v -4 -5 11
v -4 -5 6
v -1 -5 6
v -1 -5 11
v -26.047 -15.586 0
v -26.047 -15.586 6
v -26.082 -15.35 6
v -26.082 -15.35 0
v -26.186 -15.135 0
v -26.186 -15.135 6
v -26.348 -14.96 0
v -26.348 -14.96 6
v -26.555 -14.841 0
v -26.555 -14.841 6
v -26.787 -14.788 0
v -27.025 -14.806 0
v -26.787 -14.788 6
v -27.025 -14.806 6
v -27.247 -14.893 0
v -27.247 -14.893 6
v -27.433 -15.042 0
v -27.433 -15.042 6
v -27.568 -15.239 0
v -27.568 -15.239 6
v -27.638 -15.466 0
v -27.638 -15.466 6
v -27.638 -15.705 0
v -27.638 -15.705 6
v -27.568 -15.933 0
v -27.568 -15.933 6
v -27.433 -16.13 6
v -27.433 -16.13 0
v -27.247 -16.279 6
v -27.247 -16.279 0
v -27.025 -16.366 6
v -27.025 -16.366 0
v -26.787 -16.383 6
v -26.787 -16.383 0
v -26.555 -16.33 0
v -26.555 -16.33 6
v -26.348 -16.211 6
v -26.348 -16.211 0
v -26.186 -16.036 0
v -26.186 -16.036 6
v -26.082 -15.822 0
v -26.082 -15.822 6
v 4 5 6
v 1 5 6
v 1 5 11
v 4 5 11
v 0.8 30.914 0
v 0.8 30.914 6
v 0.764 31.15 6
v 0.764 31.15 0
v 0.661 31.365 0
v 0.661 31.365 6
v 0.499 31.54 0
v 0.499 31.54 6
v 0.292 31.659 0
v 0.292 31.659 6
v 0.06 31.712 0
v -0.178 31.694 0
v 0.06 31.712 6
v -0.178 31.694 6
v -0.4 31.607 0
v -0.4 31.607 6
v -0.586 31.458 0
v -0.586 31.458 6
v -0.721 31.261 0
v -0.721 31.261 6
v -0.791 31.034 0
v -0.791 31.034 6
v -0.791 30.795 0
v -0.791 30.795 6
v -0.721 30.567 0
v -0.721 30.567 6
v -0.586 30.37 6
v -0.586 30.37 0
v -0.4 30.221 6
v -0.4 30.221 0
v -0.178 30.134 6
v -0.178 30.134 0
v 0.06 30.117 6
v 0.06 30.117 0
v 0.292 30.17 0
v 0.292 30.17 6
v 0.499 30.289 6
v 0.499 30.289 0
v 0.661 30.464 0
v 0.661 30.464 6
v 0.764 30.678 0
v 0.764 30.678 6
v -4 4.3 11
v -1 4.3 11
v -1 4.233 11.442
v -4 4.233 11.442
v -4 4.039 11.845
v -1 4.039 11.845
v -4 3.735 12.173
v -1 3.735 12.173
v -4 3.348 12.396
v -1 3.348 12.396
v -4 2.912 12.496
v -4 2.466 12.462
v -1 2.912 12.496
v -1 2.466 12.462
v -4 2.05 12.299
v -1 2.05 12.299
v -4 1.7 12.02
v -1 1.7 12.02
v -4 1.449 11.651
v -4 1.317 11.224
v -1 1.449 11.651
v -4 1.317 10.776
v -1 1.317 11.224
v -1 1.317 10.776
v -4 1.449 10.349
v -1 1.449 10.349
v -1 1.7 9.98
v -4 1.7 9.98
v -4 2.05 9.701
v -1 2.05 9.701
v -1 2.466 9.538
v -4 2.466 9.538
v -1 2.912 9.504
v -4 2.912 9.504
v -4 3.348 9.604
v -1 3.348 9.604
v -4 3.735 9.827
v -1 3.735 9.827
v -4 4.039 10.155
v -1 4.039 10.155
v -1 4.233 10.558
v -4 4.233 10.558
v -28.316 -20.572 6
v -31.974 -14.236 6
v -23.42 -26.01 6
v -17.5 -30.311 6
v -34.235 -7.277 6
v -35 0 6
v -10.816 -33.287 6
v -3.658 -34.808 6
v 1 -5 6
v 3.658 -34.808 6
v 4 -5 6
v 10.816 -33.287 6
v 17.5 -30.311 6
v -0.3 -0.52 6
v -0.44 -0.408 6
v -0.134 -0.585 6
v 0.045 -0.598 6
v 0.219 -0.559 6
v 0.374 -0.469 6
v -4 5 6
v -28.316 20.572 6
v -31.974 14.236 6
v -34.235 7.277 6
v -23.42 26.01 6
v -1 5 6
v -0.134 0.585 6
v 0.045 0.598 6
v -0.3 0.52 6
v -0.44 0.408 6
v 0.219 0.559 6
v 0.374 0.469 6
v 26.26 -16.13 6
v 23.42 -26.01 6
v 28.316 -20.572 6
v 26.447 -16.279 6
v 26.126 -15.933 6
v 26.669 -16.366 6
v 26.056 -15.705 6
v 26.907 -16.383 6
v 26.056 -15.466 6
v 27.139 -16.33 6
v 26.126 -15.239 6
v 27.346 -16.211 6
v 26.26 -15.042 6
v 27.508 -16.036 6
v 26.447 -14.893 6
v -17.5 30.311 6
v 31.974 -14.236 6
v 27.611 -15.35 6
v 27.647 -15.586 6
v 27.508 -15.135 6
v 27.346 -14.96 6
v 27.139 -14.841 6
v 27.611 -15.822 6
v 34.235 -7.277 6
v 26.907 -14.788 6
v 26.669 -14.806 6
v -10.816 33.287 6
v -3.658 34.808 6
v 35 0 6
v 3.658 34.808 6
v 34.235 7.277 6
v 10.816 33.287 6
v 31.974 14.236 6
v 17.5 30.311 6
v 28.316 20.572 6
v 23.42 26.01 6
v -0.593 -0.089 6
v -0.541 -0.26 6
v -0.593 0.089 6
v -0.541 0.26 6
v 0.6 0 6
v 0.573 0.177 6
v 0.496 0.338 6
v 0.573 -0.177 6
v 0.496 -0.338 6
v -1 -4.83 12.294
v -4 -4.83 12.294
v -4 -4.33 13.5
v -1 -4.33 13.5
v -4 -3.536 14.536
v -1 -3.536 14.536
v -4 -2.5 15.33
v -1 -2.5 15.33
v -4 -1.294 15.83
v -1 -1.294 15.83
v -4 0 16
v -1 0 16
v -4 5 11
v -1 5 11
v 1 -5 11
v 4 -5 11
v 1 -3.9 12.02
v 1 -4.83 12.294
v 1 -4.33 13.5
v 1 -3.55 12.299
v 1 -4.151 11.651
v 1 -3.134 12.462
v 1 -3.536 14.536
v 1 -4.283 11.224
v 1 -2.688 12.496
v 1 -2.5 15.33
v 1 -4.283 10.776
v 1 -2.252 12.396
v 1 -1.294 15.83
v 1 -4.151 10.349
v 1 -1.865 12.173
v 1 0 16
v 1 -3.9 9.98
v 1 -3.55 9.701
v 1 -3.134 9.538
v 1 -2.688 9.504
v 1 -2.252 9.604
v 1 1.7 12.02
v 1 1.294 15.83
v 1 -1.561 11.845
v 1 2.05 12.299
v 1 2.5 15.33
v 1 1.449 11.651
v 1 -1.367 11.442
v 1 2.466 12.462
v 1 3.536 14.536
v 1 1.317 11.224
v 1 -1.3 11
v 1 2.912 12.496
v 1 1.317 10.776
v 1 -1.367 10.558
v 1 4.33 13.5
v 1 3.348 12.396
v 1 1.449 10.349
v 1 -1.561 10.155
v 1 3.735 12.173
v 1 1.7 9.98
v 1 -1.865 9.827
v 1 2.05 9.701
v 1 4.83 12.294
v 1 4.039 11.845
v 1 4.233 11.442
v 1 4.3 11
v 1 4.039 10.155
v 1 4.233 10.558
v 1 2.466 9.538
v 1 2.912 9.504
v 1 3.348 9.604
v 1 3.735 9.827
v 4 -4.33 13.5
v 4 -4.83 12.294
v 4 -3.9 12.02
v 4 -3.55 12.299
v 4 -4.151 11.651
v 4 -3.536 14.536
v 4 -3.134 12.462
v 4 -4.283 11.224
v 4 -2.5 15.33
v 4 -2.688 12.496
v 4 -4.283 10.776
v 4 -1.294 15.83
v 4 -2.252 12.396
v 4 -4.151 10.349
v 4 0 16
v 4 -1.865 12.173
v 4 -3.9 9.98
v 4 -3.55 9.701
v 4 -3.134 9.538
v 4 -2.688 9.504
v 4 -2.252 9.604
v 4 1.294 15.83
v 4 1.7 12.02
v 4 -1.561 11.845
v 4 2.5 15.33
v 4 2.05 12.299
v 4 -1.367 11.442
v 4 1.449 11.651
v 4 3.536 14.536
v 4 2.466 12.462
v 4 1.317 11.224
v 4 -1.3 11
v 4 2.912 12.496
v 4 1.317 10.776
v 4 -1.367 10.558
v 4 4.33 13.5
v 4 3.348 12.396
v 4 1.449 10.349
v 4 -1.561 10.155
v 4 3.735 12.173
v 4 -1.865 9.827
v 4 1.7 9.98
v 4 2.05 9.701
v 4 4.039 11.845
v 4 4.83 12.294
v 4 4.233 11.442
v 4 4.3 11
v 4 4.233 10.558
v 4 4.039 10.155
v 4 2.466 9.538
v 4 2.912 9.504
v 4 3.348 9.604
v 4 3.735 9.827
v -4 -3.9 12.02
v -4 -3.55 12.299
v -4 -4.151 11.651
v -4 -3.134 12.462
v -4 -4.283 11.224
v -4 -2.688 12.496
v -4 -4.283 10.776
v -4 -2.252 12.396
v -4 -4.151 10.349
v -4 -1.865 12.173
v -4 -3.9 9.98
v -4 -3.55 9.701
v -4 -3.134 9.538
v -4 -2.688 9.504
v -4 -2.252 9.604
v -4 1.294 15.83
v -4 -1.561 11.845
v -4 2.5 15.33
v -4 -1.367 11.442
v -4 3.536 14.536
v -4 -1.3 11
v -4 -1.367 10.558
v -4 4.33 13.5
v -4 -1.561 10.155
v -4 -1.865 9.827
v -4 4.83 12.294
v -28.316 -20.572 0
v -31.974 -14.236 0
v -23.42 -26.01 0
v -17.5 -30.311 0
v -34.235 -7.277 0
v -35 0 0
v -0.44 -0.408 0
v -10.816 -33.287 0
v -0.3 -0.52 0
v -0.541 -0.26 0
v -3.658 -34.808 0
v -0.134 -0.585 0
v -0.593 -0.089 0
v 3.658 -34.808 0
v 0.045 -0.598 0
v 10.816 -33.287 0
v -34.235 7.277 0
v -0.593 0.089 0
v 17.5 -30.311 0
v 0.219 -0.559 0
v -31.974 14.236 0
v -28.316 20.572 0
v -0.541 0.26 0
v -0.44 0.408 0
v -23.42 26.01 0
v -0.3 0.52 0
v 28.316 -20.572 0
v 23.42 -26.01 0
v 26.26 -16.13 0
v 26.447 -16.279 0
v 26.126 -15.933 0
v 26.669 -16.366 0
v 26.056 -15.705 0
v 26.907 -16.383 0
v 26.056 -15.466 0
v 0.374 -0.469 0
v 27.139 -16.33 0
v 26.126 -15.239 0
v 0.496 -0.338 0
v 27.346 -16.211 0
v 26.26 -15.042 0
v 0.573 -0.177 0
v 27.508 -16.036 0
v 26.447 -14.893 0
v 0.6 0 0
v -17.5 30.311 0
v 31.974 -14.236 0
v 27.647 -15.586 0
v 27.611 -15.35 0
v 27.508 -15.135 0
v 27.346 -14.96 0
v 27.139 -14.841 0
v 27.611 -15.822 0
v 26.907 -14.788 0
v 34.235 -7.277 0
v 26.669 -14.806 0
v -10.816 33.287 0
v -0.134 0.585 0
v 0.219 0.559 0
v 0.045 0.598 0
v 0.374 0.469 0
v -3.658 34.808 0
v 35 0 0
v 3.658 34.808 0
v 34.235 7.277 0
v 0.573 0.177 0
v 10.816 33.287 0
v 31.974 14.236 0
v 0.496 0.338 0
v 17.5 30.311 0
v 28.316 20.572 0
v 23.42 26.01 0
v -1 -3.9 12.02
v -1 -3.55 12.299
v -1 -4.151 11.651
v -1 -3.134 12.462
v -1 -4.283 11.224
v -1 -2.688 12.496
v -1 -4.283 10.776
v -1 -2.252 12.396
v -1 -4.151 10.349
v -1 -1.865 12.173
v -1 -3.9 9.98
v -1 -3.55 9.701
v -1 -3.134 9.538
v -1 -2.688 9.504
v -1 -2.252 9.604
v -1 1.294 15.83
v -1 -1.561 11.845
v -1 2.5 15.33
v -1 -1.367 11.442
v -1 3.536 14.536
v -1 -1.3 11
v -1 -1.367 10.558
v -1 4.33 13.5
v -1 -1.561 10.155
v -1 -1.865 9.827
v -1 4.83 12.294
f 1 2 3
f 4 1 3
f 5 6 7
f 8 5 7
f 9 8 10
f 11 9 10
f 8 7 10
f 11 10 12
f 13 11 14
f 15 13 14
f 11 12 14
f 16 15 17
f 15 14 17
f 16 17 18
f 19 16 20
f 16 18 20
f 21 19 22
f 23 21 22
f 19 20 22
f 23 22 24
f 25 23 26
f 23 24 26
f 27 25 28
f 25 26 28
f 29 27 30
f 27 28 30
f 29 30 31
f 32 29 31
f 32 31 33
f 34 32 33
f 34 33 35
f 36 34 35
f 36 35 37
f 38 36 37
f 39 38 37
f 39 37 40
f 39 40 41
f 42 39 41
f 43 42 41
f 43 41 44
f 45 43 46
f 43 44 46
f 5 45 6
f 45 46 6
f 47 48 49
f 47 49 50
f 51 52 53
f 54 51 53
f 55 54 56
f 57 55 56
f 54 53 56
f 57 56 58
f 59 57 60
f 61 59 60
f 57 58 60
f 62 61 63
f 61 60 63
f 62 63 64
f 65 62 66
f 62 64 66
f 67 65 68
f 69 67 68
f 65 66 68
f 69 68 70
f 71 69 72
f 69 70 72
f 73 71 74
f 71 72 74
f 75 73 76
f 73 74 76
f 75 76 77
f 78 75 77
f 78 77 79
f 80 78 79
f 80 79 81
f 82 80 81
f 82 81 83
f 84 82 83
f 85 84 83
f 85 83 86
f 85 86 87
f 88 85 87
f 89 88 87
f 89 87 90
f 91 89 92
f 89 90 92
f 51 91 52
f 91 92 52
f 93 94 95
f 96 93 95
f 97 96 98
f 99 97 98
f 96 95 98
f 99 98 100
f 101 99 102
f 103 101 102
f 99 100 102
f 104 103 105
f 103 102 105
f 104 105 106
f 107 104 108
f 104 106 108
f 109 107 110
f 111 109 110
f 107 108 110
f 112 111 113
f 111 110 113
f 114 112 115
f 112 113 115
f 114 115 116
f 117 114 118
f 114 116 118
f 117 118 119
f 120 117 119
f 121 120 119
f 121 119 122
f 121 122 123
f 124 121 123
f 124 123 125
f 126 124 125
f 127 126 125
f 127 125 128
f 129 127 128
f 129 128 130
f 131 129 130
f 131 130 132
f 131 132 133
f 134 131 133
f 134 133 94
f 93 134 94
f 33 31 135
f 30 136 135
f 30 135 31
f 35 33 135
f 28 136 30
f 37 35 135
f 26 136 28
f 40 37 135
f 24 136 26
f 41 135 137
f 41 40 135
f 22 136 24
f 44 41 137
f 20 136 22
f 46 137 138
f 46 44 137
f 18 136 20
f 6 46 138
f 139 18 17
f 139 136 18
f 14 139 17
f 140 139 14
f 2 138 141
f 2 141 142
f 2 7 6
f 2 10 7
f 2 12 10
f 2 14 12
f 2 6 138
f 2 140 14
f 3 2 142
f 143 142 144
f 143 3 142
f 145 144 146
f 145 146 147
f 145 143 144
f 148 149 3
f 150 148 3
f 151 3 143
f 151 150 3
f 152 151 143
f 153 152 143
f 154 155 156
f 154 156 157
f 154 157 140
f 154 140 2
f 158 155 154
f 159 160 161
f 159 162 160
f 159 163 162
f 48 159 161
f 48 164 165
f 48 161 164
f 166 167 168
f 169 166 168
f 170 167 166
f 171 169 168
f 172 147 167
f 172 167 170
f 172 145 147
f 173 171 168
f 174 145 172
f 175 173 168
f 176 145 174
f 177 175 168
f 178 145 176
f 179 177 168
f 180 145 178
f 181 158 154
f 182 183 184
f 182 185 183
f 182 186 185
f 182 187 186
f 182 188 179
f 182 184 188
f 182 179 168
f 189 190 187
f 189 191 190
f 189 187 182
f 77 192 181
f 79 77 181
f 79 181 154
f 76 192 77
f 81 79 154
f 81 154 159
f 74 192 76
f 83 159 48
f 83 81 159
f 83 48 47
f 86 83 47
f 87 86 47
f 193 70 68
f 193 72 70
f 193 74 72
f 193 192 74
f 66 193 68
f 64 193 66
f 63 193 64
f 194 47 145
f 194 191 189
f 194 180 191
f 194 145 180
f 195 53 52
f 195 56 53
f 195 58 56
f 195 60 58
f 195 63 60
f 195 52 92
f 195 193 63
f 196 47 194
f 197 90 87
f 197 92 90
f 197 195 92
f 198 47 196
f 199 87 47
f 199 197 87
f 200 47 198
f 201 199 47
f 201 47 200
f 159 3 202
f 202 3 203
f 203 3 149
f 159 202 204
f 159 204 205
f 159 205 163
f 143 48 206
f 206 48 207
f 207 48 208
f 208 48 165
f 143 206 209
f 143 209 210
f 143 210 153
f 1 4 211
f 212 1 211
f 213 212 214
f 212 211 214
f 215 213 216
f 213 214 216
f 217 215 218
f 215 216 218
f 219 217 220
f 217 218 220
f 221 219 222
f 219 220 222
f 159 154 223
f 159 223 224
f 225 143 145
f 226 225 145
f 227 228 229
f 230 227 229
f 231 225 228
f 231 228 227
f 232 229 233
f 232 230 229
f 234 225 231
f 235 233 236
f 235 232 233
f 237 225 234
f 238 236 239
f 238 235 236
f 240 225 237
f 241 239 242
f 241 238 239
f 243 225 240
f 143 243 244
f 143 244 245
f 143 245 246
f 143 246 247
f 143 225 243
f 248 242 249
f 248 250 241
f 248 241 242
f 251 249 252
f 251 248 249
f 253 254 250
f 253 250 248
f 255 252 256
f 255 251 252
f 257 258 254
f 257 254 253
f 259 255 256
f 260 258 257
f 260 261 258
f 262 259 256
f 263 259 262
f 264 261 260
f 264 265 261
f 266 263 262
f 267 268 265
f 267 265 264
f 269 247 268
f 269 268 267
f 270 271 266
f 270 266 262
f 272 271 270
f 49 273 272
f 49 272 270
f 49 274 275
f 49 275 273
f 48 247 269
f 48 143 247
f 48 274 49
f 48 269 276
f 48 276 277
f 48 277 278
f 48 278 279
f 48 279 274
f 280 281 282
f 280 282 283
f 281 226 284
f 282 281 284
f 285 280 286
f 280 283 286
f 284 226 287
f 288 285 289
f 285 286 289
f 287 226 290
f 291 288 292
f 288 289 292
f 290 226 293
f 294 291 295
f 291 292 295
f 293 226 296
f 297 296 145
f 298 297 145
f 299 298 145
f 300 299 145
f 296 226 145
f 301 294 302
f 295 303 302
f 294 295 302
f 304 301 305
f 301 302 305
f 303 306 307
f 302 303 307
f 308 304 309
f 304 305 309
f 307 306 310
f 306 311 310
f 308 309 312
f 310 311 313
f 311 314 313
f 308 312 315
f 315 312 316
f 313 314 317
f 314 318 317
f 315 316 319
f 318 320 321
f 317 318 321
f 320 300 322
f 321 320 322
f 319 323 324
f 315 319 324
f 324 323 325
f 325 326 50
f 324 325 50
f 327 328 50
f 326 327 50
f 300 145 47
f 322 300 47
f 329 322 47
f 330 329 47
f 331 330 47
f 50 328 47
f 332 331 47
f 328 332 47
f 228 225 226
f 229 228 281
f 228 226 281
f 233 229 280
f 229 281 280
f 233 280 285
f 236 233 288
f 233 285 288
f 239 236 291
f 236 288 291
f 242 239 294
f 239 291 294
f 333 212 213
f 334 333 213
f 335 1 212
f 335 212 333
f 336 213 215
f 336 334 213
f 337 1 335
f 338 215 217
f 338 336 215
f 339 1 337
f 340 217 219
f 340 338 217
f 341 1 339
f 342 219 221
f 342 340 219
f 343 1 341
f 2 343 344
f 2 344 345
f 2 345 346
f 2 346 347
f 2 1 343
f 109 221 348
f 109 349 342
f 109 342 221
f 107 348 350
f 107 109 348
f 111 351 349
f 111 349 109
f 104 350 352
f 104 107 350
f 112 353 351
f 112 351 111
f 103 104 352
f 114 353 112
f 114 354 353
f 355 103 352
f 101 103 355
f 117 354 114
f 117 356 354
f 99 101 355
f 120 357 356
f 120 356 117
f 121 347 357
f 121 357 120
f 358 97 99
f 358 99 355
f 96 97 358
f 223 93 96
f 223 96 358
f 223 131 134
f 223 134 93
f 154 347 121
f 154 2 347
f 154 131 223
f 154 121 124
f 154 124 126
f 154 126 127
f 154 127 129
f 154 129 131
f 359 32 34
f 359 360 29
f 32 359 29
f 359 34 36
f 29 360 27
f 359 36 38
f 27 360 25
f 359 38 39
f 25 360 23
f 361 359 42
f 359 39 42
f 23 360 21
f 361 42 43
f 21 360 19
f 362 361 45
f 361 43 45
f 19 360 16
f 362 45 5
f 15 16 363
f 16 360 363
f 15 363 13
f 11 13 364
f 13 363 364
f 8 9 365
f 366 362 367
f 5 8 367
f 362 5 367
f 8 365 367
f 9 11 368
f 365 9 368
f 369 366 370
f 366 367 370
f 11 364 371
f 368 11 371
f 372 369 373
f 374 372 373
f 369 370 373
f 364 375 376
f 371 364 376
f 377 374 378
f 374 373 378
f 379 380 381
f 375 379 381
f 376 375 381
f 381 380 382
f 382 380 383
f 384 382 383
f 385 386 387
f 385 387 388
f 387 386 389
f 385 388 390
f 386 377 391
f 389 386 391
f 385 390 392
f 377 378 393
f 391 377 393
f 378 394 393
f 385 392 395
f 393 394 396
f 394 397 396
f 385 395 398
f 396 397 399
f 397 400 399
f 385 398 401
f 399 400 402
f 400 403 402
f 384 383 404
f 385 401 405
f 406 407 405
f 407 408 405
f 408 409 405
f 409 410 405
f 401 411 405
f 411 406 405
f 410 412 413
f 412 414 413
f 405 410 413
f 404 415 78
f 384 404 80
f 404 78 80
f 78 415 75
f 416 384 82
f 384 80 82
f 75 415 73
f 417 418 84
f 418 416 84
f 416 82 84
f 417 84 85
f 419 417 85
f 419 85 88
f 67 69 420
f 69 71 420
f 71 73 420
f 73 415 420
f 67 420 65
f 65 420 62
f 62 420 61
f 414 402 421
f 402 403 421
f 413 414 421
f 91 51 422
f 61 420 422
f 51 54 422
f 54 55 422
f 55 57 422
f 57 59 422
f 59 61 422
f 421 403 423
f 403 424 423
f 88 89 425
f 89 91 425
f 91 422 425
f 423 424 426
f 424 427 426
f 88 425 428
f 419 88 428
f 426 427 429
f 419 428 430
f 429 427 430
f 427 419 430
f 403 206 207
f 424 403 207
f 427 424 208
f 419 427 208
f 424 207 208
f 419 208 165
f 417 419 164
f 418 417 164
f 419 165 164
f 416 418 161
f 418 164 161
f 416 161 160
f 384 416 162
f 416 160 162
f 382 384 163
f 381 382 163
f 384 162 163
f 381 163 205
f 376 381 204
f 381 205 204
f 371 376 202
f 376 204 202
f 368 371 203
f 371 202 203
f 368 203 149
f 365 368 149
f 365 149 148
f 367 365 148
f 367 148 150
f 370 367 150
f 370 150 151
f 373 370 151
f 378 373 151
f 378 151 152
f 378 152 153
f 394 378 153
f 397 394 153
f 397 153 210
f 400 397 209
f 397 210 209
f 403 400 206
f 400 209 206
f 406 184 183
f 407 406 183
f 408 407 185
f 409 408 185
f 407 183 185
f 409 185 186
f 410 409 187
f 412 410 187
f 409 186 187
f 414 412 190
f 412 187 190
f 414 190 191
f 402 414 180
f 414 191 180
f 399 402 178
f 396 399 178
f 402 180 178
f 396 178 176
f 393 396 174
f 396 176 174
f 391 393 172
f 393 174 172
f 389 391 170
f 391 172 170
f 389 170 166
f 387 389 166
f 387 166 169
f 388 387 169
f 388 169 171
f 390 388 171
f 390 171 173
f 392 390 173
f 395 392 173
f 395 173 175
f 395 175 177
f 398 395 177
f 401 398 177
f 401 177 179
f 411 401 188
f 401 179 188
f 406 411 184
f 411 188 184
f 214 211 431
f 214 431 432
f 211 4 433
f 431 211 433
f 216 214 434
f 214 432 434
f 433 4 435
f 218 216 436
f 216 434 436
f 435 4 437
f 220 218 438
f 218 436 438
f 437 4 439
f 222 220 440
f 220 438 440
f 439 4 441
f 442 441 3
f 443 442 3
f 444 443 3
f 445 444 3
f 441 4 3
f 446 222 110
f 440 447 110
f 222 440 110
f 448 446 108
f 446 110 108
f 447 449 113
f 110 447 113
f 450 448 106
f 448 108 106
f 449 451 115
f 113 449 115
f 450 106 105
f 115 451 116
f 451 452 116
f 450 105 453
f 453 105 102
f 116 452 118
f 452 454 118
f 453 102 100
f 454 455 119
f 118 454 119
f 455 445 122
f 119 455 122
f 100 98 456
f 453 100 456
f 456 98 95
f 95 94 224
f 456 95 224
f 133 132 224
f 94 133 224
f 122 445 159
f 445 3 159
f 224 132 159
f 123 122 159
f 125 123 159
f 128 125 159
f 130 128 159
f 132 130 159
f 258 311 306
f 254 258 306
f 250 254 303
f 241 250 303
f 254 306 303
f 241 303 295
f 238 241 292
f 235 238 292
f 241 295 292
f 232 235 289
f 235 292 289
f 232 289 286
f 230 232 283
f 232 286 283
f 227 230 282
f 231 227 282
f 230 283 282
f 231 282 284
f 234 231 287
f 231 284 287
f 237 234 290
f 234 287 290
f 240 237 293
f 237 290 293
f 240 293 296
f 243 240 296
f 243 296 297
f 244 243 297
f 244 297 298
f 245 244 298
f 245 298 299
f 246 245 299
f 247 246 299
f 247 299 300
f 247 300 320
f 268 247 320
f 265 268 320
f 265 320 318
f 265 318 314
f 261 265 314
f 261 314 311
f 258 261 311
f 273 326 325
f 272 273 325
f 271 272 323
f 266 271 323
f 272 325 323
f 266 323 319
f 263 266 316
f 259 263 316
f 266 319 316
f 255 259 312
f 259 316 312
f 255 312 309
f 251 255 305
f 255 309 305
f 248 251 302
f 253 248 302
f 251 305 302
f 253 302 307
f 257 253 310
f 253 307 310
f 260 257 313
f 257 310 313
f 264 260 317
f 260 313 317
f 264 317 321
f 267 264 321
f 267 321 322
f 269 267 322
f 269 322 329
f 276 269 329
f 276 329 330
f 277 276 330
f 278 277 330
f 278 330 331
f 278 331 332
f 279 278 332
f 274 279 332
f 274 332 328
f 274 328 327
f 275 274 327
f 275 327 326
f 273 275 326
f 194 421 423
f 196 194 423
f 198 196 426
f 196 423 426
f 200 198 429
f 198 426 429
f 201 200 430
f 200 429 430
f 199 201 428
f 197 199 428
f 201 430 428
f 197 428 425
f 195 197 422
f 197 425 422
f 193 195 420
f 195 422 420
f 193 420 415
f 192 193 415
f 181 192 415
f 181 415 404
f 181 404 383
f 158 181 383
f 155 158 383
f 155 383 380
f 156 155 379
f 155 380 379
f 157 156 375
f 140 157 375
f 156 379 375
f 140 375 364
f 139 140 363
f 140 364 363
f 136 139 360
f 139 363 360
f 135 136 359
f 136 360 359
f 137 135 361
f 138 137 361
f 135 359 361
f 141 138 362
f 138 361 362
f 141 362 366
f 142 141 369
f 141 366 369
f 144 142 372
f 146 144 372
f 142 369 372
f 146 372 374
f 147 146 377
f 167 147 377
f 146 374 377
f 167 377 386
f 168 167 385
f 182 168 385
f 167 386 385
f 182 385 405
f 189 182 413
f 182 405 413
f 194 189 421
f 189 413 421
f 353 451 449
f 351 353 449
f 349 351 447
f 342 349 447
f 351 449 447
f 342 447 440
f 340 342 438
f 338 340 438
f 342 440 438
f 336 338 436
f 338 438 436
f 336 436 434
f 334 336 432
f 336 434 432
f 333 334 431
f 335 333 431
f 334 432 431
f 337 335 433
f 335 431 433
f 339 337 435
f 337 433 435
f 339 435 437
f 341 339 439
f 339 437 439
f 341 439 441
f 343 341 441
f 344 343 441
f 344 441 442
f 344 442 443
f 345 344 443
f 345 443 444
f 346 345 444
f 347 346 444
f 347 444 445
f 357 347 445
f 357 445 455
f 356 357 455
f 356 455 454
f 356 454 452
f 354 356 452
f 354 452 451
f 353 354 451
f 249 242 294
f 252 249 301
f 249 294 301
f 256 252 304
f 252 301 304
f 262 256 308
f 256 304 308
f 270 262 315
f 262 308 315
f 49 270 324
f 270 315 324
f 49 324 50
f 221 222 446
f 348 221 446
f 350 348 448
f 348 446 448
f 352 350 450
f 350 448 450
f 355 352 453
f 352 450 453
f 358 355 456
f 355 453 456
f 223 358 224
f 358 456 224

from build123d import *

# Parameters (mm, degrees)
SKETCH2_R           = 35
BOSS_EXTRUDE1_DEPTH = 6
SKETCH3_R           = 0.8
CUT_EXTRUDE1_DEPTH  = 6
SKETCH4_R           = 0.6
CUT_EXTRUDE2_DEPTH  = 6
SKETCH5_W           = 3
SKETCH5_H           = 10
BOSS_EXTRUDE2_DEPTH = 10
CUT_EXTRUDE3_DEPTH  = 55.790510127
SKETCH7_R           = 1.5
CUT_EXTRUDE4_DEPTH  = 55.790510127


with BuildPart() as part:
    # Sketch2 → Boss-Extrude1 (new body)
    with BuildSketch(Plane.XY):
        Circle(SKETCH2_R)
    extrude(amount=BOSS_EXTRUDE1_DEPTH)

    # Sketch3 → Cut-Extrude1 (cut)
    with BuildSketch(Plane.XY.offset(6)):
        with Locations((0, 30.914278185)):
            Circle(SKETCH3_R)
        with Locations((26.846787517, -15.585721815)):
            Circle(SKETCH3_R)
        with Locations((-26.846787517, -15.585721815)):
            Circle(SKETCH3_R)
    extrude(amount=-CUT_EXTRUDE1_DEPTH, mode=Mode.SUBTRACT)

    # Sketch4 → Cut-Extrude2 (cut)
    with BuildSketch(Plane.XY.offset(6)):
        Circle(SKETCH4_R)
    extrude(amount=-CUT_EXTRUDE2_DEPTH, mode=Mode.SUBTRACT)

    # Sketch5 → Boss-Extrude2 (add)
    with BuildSketch(Plane.XY.offset(6)):
        with Locations((2.5, 0)):
            Rectangle(SKETCH5_W, SKETCH5_H)
        with Locations((-2.5, 0)):
            Rectangle(SKETCH5_W, SKETCH5_H)
    extrude(amount=BOSS_EXTRUDE2_DEPTH)

    # Sketch6 → Cut-Extrude3 (cut, through all)
    with BuildSketch(Plane(origin=(4, 0, 0), x_dir=(0, 0, -1), z_dir=(1, 0, 0))):
        with BuildLine():
            ThreePointArc((-16, 0), (-14.535533906, 3.535533906), (-11, 5))
            Line((-11, 5), (-16, 5))
            Line((-16, 5), (-16, 0))
        make_face()
        with BuildLine():
            ThreePointArc((-11, -5), (-14.535533906, -3.535533906), (-16, 0))
            Line((-16, 0), (-16, -5))
            Line((-16, -5), (-11, -5))
        make_face()
    extrude(amount=-CUT_EXTRUDE3_DEPTH, mode=Mode.SUBTRACT)

    # Sketch7 → Cut-Extrude4 (cut, through all)
    with BuildSketch(Plane(origin=(4, 0, 0), x_dir=(0, 0, -1), z_dir=(1, 0, 0))):
        with Locations(Location((-11, 2.8, 0), (0, 0, 90))):
            Circle(SKETCH7_R)
        with Locations(Location((-11, -2.8, 0), (0, 0, 90))):
            Circle(SKETCH7_R)
    extrude(amount=-CUT_EXTRUDE4_DEPTH, mode=Mode.SUBTRACT)


solid = part.part
